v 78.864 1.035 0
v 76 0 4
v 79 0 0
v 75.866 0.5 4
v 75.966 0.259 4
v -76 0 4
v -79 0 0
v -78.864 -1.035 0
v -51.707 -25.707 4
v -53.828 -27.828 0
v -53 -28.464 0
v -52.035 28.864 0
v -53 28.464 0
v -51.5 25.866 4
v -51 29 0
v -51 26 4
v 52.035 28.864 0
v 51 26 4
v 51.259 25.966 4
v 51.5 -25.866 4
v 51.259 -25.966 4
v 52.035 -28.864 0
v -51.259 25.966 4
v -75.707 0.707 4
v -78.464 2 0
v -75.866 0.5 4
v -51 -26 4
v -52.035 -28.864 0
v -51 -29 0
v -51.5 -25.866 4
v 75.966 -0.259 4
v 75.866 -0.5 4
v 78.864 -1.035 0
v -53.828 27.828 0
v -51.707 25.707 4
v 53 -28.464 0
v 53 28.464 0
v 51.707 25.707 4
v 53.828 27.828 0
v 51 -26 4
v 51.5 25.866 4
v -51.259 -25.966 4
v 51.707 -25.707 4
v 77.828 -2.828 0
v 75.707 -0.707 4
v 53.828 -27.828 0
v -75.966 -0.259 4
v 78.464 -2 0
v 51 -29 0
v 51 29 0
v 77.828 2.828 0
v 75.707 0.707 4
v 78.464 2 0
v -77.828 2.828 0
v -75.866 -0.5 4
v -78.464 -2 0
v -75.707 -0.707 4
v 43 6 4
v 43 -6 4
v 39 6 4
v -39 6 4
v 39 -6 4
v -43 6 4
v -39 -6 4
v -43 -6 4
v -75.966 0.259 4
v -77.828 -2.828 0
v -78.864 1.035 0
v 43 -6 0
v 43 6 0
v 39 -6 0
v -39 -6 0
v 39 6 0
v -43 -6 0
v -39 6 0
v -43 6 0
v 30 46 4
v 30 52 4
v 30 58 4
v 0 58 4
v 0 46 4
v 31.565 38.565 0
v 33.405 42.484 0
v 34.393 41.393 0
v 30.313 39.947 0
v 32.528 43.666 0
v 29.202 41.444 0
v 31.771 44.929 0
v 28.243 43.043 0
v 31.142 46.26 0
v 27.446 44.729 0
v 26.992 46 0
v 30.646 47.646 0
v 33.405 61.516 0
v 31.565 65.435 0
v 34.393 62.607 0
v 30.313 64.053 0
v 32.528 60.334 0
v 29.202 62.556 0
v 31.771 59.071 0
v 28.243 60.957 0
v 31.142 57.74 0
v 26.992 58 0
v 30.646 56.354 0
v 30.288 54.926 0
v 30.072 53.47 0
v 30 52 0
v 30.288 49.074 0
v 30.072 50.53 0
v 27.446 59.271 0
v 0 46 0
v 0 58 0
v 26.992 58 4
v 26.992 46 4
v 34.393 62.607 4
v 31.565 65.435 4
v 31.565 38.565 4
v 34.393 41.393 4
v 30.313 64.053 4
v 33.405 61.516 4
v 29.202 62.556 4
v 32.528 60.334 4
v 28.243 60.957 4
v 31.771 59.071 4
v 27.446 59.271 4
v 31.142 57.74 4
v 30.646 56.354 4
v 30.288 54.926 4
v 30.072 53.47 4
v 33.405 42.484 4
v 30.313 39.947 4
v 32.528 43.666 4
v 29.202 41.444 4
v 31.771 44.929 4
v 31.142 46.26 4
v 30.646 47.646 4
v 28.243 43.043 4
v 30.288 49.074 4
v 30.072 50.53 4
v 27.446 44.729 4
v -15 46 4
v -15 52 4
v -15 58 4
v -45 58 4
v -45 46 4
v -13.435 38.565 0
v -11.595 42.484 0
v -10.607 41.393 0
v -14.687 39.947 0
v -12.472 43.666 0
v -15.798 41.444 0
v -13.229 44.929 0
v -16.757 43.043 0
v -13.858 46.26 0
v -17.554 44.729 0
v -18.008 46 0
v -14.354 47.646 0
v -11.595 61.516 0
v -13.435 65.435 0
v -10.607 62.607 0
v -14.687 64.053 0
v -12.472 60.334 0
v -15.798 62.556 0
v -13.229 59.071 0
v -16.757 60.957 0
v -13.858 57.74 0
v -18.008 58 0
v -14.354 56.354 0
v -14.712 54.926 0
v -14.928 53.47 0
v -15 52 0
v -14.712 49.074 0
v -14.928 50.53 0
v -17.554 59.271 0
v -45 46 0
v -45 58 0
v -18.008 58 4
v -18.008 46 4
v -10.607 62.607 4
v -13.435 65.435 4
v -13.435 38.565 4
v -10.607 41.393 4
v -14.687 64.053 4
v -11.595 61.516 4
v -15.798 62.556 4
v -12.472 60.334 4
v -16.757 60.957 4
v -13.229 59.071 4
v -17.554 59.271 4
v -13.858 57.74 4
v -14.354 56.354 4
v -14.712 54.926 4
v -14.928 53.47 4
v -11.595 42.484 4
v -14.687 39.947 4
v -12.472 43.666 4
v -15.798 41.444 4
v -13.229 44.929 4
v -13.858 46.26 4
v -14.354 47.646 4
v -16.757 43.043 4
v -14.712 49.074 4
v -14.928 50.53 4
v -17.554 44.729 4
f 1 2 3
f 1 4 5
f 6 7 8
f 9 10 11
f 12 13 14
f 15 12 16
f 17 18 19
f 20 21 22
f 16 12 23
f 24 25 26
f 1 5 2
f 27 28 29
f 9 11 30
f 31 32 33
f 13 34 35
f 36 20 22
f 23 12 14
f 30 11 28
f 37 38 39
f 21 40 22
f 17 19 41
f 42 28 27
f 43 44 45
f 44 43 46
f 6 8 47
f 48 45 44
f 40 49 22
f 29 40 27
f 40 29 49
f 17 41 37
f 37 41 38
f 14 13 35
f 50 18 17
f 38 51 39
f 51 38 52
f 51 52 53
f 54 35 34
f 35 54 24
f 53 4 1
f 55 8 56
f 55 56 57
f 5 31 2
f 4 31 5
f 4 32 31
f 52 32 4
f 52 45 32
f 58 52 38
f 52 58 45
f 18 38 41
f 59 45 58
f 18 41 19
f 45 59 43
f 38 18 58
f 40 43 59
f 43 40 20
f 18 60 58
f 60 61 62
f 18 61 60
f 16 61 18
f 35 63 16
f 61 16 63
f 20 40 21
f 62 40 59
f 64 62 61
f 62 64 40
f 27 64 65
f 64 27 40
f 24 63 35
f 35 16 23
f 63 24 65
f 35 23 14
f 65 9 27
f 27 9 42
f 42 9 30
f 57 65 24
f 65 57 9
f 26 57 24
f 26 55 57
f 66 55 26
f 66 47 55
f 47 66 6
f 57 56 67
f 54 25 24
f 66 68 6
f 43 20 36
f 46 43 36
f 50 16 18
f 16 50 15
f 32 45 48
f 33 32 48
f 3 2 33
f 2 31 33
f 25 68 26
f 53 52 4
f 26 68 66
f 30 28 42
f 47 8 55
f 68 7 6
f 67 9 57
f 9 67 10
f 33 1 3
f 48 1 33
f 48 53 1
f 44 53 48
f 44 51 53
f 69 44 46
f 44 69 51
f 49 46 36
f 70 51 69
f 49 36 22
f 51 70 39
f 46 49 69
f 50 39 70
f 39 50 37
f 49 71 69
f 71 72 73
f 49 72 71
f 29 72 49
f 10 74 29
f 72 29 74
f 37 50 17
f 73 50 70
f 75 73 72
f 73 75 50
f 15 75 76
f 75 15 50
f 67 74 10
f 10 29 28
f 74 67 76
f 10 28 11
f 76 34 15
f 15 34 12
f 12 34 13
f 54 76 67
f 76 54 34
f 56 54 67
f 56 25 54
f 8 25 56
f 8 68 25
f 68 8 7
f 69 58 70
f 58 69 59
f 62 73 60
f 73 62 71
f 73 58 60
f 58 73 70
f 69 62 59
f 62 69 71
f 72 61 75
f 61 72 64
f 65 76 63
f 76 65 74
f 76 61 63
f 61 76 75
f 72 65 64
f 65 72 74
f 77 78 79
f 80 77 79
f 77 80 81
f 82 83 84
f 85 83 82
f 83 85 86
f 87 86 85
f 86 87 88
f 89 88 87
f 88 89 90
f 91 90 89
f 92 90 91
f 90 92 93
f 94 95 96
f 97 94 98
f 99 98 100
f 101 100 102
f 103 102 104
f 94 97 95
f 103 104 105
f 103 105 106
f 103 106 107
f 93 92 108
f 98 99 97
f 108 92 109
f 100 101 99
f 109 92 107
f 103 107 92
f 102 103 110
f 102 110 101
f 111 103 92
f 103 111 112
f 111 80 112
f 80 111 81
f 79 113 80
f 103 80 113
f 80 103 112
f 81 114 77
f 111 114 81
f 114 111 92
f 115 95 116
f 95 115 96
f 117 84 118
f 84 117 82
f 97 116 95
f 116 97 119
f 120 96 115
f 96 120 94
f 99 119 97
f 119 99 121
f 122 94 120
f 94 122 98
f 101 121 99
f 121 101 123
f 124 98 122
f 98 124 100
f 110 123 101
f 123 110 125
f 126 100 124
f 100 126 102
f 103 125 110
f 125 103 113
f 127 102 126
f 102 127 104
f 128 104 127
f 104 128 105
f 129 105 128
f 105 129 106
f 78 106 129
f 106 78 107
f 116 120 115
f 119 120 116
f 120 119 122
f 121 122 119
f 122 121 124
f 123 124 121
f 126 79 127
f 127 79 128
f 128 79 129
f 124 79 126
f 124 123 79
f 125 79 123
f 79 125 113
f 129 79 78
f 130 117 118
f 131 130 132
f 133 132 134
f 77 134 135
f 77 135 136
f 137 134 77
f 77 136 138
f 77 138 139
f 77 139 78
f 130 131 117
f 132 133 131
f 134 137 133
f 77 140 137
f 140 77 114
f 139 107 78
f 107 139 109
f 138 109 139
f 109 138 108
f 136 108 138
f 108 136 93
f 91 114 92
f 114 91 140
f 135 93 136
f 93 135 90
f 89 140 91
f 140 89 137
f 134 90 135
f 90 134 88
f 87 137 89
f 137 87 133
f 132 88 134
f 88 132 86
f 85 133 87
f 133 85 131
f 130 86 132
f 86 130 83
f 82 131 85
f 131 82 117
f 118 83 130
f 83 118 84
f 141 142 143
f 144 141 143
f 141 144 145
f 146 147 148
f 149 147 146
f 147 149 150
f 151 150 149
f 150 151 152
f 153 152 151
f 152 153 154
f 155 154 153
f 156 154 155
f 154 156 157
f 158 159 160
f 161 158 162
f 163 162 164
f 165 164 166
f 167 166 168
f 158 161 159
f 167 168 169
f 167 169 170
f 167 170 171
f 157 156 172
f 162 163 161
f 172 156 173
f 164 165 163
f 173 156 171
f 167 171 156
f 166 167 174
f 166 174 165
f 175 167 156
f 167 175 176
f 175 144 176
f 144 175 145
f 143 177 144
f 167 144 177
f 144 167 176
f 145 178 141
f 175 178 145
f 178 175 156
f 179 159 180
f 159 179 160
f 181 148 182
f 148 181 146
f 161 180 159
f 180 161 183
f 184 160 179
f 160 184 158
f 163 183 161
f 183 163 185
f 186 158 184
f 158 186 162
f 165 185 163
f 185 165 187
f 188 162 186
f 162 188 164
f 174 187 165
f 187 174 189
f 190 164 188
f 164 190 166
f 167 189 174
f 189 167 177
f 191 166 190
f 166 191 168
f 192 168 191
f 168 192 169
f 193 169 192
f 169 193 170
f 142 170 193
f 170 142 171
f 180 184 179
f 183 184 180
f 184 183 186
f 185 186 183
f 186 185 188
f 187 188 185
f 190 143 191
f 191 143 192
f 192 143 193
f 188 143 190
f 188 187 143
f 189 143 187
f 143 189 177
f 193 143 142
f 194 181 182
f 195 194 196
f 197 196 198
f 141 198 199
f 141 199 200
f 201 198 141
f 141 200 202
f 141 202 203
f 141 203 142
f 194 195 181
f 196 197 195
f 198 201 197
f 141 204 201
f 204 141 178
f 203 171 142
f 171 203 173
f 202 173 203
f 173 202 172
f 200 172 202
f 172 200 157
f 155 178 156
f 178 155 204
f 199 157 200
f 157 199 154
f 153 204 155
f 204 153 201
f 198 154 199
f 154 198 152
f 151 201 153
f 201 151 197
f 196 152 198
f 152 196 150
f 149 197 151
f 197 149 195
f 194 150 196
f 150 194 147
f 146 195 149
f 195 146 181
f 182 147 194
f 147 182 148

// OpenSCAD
SUPPORT_GAP = 82;
BASE_WIDTH = 50;
BASE_LENGTH = 150;
BASE_THICKNESS = 4;
BASE_CORNER_CUT = 24;

SUPPORT_THICKNESS = BASE_THICKNESS;
SUPPORT_LENGTH = 12;
SUPPORT_HEIGHT = 30;

LIGHTSABER_RADIUS = 30/2;

module base_primitive() {
  cylinder(h=BASE_THICKNESS, r1=BASE_THICKNESS, r2=1, $fn=24);
}

module base() {
  difference() {
    hull() {
      translate([ BASE_LENGTH/2, 0, 0]) base_primitive();
      translate([-BASE_LENGTH/2, 0, 0]) base_primitive();
      translate([ BASE_LENGTH/2-BASE_CORNER_CUT,  BASE_WIDTH/2, 0]) base_primitive();
      translate([ BASE_LENGTH/2-BASE_CORNER_CUT, -BASE_WIDTH/2, 0]) base_primitive();
      translate([-BASE_LENGTH/2+BASE_CORNER_CUT,  BASE_WIDTH/2, 0]) base_primitive();
      translate([-BASE_LENGTH/2+BASE_CORNER_CUT, -BASE_WIDTH/2, 0]) base_primitive();
    }
    translate([ SUPPORT_GAP/2, 0, BASE_THICKNESS]) cube([SUPPORT_THICKNESS, SUPPORT_LENGTH, BASE_THICKNESS*2], center=true);
    translate([-SUPPORT_GAP/2, 0, BASE_THICKNESS]) cube([SUPPORT_THICKNESS, SUPPORT_LENGTH, BASE_THICKNESS*2], center=true);
  }
}

module support() {
  translate([0, -SUPPORT_LENGTH/2, 0]) cube([SUPPORT_HEIGHT, SUPPORT_LENGTH, SUPPORT_THICKNESS]);
  translate([SUPPORT_HEIGHT+LIGHTSABER_RADIUS, 0, 0]) rotate(135) rotate_extrude(convexity = 10, angle=90, $fn=64)
    translate([LIGHTSABER_RADIUS, 0, 0])
        square([4, SUPPORT_THICKNESS]);
}

base();
translate([0, 52, 0]) support();
translate([-SUPPORT_HEIGHT-LIGHTSABER_RADIUS, 52, 0]) support();
